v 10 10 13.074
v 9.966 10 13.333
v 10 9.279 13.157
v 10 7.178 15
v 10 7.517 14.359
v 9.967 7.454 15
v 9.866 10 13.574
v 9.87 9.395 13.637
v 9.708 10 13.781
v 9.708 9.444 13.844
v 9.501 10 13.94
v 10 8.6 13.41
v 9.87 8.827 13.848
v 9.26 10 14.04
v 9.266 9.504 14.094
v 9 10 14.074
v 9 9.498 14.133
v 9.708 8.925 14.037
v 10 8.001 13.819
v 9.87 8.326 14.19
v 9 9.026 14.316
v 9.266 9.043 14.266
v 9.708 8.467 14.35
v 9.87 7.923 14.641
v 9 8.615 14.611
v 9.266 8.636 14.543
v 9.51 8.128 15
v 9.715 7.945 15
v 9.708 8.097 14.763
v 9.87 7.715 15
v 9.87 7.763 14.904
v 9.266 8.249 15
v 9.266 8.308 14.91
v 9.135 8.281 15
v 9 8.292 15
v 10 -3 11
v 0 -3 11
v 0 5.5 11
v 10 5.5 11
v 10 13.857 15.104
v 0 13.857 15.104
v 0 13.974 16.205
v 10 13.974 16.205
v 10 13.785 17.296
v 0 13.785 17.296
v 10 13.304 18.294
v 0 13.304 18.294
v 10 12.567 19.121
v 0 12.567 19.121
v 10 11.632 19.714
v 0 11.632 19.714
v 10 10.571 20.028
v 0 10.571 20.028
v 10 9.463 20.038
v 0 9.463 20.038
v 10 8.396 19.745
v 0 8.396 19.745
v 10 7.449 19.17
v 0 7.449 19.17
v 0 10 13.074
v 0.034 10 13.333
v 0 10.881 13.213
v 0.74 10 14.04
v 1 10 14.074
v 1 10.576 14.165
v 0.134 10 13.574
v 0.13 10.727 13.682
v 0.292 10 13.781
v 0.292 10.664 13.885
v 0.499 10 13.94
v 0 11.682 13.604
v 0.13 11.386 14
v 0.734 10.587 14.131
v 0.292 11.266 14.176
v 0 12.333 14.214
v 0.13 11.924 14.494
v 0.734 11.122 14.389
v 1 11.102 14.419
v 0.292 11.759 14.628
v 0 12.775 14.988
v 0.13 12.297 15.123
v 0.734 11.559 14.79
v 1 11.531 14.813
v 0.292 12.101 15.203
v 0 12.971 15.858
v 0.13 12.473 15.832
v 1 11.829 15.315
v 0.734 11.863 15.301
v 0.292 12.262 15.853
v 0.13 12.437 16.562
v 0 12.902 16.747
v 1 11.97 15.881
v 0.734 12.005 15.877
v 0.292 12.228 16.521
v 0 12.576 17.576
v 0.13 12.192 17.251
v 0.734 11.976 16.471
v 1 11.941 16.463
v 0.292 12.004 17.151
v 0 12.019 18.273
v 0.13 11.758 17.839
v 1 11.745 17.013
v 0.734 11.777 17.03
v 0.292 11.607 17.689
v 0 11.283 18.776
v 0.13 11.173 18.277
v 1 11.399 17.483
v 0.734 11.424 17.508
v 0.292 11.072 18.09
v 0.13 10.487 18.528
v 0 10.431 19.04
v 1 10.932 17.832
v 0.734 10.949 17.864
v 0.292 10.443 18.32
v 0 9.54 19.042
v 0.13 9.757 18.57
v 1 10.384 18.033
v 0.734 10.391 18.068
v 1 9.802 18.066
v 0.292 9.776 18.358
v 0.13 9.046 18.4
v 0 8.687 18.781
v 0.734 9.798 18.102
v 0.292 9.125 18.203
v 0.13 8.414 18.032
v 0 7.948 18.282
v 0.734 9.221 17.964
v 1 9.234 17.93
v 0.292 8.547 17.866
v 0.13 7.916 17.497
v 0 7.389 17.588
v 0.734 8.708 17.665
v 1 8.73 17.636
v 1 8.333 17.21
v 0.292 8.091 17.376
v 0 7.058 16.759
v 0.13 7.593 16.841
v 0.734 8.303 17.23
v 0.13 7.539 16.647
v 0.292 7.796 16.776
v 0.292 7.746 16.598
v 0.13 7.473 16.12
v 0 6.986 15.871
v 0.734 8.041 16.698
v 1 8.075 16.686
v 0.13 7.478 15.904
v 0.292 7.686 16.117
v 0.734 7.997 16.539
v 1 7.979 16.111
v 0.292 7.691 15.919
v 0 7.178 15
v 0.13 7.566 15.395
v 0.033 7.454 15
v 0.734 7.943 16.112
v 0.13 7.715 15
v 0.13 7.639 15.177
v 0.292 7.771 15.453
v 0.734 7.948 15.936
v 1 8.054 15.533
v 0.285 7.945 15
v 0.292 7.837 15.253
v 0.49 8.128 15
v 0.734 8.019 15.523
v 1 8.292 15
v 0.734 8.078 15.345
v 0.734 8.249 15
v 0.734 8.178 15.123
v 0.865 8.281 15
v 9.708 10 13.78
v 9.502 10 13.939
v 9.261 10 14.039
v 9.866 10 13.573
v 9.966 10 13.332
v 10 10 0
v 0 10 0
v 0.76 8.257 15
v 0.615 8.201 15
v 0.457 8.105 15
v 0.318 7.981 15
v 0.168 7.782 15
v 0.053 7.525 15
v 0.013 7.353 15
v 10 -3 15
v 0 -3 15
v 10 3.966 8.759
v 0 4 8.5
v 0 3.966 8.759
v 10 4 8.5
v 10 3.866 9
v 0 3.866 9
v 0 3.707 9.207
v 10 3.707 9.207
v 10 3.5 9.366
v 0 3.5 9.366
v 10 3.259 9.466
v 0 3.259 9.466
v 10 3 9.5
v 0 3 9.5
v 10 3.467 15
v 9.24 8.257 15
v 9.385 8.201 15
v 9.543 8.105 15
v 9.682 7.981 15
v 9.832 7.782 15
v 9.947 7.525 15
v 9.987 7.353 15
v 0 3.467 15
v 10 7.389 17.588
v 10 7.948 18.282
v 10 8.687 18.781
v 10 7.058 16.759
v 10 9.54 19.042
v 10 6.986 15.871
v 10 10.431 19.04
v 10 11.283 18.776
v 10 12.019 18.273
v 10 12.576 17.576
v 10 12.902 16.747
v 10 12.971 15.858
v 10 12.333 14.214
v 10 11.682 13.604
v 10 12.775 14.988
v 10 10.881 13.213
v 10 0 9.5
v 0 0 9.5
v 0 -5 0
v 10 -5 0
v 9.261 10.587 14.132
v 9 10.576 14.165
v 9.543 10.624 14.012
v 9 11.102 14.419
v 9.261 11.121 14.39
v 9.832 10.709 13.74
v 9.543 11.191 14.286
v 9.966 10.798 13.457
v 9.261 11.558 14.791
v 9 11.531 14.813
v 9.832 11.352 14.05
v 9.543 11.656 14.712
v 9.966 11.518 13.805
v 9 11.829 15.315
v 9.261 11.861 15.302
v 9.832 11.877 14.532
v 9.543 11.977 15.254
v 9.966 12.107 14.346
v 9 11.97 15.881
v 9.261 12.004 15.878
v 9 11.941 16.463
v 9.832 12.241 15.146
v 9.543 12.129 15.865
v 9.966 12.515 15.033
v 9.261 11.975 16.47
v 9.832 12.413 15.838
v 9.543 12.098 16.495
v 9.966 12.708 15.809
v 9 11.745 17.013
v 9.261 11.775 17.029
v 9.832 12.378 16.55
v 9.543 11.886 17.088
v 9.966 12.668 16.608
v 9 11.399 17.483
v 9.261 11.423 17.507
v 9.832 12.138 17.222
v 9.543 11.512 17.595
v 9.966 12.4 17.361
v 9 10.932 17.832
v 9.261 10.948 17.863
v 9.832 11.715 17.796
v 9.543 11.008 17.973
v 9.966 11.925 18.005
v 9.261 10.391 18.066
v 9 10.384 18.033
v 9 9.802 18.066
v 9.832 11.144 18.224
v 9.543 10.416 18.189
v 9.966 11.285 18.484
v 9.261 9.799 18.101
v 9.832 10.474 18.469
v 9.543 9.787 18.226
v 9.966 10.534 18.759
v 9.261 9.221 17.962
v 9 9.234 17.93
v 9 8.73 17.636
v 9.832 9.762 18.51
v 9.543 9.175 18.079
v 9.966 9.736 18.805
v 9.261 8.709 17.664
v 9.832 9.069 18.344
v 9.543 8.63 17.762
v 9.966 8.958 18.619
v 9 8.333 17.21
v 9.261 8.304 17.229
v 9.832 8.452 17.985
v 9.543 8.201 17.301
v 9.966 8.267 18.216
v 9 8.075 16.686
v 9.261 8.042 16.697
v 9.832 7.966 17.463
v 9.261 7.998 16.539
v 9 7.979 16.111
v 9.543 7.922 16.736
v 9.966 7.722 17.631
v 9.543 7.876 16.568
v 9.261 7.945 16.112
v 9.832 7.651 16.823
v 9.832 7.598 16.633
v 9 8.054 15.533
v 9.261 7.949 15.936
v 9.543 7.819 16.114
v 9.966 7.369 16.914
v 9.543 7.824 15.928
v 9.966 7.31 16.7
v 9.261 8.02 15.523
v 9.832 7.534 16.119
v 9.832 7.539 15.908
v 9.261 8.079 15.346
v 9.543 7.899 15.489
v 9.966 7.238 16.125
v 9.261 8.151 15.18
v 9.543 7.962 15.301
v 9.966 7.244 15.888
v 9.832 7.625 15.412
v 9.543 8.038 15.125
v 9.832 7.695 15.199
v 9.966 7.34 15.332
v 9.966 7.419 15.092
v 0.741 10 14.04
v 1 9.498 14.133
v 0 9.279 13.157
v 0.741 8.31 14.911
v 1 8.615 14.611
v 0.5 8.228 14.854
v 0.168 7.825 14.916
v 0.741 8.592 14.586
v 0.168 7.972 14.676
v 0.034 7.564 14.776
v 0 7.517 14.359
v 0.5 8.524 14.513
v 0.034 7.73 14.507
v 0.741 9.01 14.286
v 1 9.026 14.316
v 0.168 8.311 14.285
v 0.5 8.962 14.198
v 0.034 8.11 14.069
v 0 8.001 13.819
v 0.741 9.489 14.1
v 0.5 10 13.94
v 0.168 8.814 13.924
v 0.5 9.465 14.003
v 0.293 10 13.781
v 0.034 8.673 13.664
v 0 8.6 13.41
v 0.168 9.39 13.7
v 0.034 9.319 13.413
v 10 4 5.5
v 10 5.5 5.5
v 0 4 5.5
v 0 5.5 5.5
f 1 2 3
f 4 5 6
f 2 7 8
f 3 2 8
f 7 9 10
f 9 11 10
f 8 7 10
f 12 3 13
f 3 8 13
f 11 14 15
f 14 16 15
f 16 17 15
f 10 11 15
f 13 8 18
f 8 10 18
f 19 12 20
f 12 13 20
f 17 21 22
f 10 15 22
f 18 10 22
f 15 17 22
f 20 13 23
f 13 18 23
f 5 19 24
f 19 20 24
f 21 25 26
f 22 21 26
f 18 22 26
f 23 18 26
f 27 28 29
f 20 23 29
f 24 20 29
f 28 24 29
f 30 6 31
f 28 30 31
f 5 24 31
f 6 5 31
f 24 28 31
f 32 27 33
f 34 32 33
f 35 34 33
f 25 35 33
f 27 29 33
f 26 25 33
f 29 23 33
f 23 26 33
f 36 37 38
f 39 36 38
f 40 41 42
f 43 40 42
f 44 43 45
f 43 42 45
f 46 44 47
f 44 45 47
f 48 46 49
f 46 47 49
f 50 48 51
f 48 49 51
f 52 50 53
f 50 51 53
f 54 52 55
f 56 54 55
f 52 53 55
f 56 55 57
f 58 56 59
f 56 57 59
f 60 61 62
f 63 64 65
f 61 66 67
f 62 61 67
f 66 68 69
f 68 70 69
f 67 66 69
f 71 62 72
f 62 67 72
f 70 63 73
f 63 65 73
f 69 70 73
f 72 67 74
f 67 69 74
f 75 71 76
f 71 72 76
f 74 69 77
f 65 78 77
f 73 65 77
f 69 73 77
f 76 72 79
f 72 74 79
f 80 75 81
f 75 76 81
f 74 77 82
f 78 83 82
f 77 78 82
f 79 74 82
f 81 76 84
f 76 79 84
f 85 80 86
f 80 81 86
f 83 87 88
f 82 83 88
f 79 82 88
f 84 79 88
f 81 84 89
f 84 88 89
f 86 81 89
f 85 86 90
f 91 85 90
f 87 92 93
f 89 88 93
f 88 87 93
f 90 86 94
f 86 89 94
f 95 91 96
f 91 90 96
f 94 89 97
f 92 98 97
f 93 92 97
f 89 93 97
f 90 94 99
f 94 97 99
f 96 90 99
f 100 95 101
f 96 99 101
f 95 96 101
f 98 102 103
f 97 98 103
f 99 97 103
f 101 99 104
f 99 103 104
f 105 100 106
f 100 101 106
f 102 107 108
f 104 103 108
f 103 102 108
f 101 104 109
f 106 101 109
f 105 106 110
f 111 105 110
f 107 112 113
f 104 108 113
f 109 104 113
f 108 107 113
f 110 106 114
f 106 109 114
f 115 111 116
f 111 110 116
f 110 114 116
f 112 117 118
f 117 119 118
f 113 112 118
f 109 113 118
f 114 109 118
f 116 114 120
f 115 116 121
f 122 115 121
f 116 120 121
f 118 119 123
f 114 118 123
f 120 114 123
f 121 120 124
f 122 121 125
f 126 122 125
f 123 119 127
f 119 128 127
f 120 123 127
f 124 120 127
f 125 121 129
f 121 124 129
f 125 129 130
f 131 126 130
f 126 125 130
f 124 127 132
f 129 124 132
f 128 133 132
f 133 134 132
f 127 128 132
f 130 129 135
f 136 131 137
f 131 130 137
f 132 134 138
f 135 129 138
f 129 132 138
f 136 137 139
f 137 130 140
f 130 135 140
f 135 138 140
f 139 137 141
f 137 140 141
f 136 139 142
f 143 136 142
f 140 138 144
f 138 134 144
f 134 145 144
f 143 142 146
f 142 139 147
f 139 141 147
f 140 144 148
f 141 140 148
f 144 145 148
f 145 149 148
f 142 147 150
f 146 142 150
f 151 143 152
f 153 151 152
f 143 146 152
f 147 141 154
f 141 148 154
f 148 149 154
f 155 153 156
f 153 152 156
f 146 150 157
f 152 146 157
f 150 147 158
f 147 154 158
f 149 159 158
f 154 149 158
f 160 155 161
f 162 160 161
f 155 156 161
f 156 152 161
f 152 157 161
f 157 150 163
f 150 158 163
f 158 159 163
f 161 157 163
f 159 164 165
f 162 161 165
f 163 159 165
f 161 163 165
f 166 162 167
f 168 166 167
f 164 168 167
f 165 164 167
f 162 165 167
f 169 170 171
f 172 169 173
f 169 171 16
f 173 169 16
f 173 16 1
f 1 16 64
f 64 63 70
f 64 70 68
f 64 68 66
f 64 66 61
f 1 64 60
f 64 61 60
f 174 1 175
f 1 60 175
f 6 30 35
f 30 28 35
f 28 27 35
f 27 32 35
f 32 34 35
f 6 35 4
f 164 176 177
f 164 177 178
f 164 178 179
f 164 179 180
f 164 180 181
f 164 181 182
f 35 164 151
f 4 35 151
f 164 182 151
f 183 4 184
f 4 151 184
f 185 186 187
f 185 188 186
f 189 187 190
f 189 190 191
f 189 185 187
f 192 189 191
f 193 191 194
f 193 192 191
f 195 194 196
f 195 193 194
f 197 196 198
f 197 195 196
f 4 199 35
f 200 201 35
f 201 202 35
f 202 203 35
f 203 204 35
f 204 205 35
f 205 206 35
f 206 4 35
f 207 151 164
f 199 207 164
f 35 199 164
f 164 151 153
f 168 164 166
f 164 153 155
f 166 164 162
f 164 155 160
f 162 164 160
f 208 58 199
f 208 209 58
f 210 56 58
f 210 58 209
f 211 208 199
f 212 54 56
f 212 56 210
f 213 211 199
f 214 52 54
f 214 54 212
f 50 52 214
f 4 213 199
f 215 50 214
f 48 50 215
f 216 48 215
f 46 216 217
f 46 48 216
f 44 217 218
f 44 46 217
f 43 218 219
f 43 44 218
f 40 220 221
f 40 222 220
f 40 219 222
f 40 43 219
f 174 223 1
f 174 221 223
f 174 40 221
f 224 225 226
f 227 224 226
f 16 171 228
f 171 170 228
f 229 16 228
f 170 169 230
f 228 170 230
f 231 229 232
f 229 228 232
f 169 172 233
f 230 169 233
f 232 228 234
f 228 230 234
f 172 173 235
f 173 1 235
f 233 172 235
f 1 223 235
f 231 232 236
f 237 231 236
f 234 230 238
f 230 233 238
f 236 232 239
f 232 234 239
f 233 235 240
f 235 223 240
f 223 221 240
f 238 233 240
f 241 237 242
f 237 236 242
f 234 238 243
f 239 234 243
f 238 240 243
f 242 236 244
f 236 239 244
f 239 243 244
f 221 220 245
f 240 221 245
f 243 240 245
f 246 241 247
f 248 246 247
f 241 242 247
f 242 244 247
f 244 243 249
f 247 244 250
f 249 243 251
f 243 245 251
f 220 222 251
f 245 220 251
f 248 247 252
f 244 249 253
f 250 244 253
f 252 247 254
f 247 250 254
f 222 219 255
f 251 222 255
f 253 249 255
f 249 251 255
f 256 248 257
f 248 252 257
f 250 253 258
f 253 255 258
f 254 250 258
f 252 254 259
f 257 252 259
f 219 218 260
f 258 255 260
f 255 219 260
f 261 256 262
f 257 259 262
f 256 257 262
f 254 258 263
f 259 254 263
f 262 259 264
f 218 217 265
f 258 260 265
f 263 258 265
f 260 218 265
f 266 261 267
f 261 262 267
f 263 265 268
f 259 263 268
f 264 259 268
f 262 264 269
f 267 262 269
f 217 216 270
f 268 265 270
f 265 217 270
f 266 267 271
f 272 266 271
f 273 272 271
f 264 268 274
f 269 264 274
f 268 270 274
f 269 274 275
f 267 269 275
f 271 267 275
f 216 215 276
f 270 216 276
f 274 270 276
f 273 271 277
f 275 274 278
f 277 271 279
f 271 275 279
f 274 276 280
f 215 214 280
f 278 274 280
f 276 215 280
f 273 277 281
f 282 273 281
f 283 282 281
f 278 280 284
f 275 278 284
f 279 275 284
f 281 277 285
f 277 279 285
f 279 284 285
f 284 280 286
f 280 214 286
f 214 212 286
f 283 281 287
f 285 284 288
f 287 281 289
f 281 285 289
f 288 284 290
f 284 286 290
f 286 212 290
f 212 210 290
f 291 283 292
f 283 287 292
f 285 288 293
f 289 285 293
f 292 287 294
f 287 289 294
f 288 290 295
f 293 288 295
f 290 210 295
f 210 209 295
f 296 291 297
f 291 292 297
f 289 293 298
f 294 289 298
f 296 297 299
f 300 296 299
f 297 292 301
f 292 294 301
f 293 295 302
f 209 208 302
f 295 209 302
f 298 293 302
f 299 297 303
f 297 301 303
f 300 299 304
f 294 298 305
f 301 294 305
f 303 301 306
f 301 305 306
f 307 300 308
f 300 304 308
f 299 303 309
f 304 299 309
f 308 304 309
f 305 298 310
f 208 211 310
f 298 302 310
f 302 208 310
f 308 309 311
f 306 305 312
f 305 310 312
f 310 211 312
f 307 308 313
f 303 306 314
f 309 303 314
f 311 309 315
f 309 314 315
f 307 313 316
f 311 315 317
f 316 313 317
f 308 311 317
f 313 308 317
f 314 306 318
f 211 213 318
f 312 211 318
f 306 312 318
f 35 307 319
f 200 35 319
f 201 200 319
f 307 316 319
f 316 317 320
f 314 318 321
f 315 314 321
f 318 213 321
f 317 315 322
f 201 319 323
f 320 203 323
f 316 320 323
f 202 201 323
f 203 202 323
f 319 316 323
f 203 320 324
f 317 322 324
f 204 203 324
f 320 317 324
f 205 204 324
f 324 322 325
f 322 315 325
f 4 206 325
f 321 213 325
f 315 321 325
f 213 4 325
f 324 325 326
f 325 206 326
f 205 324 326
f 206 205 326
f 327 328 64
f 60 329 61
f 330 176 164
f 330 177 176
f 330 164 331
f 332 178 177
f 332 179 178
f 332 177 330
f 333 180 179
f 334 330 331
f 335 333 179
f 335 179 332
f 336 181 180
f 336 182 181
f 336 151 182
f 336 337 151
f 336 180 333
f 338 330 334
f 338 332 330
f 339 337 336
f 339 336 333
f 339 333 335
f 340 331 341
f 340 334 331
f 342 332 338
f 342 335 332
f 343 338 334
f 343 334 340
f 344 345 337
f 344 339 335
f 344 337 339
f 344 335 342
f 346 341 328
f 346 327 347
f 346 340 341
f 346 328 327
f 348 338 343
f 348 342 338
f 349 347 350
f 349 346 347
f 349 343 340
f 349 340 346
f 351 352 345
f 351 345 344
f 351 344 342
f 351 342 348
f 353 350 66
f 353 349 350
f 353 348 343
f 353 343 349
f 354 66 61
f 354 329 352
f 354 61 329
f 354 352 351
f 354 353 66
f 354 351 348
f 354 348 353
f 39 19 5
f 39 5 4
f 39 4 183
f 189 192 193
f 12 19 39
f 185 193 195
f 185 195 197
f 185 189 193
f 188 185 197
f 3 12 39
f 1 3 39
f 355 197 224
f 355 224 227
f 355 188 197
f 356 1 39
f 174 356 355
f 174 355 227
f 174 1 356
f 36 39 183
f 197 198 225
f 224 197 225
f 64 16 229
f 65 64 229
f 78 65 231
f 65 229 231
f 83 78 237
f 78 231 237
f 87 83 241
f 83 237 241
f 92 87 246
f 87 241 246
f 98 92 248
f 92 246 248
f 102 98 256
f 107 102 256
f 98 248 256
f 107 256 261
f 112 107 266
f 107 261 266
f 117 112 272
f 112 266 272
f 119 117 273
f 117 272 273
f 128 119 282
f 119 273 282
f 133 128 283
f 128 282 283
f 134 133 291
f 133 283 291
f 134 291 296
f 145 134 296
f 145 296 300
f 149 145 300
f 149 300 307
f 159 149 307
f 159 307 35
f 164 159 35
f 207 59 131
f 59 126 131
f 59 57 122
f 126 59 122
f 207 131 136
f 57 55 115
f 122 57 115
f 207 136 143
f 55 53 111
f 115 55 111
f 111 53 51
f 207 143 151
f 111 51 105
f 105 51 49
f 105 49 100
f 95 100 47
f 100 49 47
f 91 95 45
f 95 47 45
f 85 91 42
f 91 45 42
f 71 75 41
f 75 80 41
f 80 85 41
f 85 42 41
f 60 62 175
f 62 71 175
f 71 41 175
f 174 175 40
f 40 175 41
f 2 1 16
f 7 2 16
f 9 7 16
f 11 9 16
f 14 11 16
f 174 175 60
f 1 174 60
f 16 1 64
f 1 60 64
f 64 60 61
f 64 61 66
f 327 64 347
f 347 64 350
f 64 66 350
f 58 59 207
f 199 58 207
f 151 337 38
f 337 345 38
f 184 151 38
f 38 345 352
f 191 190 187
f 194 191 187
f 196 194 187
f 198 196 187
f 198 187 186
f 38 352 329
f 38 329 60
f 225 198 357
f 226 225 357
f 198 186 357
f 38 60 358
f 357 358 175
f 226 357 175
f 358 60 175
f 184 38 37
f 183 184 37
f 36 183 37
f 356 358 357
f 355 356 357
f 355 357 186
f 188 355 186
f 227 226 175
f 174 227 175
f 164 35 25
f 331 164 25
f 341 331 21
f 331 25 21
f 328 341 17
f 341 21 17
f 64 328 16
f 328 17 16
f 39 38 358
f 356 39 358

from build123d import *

# Parameters (mm, degrees)
BOSS_EXTRU_5_DEPTH      = 10
CONG_1_R                = 1
BOSS_EXTRU_6_DEPTH      = 10
ESQUISSE8_R             = 2
ENL_V_MAT_EXTRU_1_DEPTH = 27.423794497
CONG_3_R                = 1
CONG_4_R                = 1
CONG_5_R                = 1
CONG_6_R                = 1


with BuildPart() as part:
    # Esquisse5 → Boss.-Extru.5 (new body)
    with BuildSketch(Plane(origin=(0, 0, 0), x_dir=(0, 0, -1), z_dir=(1, 0, 0))):
        Polygon((0, -5), (0, 10), (-15, 10), (-15, -3), (-11, -3), (-11, 5.5), (-5.5, 5.5), (-5.5, 4), (-9.5, 4), (-9.5, 0), align=None)
    extrude(amount=BOSS_EXTRU_5_DEPTH)

    # Congé1
    cong_1_edges = [part.edges().sort_by_distance(p)[0] for p in [
        (5, 4, 9.5),
    ]]
    fillet(cong_1_edges, radius=CONG_1_R)


with BuildPart() as body_2:
    # Esquisse7 → Boss.-Extru.6 (new body)
    with BuildSketch(Plane.ZY):
        with BuildLine():
            Line((0, 10), (15.104430089, 13.85720698))
            ThreePointArc((15.104430089, 13.85720698), (19.449639193, 12.120509449), (19.169719572, 7.449470434))
            Line((19.169719572, 7.449470434), (15, 3.466574051))
            Line((15, 3.466574051), (15, 10))
            Line((15, 10), (0, 10))
        make_face()
    extrude(amount=-BOSS_EXTRU_6_DEPTH)


with BuildPart() as enl_v_mat_extru_1_tool:
    # Esquisse8 → Enlèv. mat.-Extru.1 (new, through all)
    with BuildSketch(Plane(origin=(10, 0, 0), x_dir=(0, 0, -1), z_dir=(1, 0, 0))):
        with Locations((-16.074008639, 9.978892781)):
            Circle(ESQUISSE8_R)
    extrude(amount=-ENL_V_MAT_EXTRU_1_DEPTH)


with BuildPart() as part_1:
    add(part.part)

    # Enlèv. mat.-Extru.1: cut by enl_v_mat_extru_1_tool
    add(enl_v_mat_extru_1_tool.part, mode=Mode.SUBTRACT)

    # Congé5
    cong_5_edges = [part_1.edges().sort_by_distance(p)[0] for p in [
        (10, 9.025873602, 14.315670093),
    ]]
    fillet(cong_5_edges, radius=CONG_5_R)

    # Congé6
    cong_6_edges = [part_1.edges().sort_by_distance(p)[0] for p in [
        (0, 9.025873602, 14.315670093),
    ]]
    fillet(cong_6_edges, radius=CONG_6_R)


with BuildPart() as body_2_1:
    add(body_2.part)

    # Enlèv. mat.-Extru.1: cut by enl_v_mat_extru_1_tool
    add(enl_v_mat_extru_1_tool.part, mode=Mode.SUBTRACT)

    # Congé3
    cong_3_edges = [body_2_1.edges().sort_by_distance(p)[0] for p in [
        (0, 10.931911961, 17.832347185),
    ]]
    fillet(cong_3_edges, radius=CONG_3_R)

    # Congé4
    cong_4_edges = [body_2_1.edges().sort_by_distance(p)[0] for p in [
        (10, 10.931911961, 17.832347185),
    ]]
    fillet(cong_4_edges, radius=CONG_4_R)


solid = Compound([part_1.part, body_2_1.part])
